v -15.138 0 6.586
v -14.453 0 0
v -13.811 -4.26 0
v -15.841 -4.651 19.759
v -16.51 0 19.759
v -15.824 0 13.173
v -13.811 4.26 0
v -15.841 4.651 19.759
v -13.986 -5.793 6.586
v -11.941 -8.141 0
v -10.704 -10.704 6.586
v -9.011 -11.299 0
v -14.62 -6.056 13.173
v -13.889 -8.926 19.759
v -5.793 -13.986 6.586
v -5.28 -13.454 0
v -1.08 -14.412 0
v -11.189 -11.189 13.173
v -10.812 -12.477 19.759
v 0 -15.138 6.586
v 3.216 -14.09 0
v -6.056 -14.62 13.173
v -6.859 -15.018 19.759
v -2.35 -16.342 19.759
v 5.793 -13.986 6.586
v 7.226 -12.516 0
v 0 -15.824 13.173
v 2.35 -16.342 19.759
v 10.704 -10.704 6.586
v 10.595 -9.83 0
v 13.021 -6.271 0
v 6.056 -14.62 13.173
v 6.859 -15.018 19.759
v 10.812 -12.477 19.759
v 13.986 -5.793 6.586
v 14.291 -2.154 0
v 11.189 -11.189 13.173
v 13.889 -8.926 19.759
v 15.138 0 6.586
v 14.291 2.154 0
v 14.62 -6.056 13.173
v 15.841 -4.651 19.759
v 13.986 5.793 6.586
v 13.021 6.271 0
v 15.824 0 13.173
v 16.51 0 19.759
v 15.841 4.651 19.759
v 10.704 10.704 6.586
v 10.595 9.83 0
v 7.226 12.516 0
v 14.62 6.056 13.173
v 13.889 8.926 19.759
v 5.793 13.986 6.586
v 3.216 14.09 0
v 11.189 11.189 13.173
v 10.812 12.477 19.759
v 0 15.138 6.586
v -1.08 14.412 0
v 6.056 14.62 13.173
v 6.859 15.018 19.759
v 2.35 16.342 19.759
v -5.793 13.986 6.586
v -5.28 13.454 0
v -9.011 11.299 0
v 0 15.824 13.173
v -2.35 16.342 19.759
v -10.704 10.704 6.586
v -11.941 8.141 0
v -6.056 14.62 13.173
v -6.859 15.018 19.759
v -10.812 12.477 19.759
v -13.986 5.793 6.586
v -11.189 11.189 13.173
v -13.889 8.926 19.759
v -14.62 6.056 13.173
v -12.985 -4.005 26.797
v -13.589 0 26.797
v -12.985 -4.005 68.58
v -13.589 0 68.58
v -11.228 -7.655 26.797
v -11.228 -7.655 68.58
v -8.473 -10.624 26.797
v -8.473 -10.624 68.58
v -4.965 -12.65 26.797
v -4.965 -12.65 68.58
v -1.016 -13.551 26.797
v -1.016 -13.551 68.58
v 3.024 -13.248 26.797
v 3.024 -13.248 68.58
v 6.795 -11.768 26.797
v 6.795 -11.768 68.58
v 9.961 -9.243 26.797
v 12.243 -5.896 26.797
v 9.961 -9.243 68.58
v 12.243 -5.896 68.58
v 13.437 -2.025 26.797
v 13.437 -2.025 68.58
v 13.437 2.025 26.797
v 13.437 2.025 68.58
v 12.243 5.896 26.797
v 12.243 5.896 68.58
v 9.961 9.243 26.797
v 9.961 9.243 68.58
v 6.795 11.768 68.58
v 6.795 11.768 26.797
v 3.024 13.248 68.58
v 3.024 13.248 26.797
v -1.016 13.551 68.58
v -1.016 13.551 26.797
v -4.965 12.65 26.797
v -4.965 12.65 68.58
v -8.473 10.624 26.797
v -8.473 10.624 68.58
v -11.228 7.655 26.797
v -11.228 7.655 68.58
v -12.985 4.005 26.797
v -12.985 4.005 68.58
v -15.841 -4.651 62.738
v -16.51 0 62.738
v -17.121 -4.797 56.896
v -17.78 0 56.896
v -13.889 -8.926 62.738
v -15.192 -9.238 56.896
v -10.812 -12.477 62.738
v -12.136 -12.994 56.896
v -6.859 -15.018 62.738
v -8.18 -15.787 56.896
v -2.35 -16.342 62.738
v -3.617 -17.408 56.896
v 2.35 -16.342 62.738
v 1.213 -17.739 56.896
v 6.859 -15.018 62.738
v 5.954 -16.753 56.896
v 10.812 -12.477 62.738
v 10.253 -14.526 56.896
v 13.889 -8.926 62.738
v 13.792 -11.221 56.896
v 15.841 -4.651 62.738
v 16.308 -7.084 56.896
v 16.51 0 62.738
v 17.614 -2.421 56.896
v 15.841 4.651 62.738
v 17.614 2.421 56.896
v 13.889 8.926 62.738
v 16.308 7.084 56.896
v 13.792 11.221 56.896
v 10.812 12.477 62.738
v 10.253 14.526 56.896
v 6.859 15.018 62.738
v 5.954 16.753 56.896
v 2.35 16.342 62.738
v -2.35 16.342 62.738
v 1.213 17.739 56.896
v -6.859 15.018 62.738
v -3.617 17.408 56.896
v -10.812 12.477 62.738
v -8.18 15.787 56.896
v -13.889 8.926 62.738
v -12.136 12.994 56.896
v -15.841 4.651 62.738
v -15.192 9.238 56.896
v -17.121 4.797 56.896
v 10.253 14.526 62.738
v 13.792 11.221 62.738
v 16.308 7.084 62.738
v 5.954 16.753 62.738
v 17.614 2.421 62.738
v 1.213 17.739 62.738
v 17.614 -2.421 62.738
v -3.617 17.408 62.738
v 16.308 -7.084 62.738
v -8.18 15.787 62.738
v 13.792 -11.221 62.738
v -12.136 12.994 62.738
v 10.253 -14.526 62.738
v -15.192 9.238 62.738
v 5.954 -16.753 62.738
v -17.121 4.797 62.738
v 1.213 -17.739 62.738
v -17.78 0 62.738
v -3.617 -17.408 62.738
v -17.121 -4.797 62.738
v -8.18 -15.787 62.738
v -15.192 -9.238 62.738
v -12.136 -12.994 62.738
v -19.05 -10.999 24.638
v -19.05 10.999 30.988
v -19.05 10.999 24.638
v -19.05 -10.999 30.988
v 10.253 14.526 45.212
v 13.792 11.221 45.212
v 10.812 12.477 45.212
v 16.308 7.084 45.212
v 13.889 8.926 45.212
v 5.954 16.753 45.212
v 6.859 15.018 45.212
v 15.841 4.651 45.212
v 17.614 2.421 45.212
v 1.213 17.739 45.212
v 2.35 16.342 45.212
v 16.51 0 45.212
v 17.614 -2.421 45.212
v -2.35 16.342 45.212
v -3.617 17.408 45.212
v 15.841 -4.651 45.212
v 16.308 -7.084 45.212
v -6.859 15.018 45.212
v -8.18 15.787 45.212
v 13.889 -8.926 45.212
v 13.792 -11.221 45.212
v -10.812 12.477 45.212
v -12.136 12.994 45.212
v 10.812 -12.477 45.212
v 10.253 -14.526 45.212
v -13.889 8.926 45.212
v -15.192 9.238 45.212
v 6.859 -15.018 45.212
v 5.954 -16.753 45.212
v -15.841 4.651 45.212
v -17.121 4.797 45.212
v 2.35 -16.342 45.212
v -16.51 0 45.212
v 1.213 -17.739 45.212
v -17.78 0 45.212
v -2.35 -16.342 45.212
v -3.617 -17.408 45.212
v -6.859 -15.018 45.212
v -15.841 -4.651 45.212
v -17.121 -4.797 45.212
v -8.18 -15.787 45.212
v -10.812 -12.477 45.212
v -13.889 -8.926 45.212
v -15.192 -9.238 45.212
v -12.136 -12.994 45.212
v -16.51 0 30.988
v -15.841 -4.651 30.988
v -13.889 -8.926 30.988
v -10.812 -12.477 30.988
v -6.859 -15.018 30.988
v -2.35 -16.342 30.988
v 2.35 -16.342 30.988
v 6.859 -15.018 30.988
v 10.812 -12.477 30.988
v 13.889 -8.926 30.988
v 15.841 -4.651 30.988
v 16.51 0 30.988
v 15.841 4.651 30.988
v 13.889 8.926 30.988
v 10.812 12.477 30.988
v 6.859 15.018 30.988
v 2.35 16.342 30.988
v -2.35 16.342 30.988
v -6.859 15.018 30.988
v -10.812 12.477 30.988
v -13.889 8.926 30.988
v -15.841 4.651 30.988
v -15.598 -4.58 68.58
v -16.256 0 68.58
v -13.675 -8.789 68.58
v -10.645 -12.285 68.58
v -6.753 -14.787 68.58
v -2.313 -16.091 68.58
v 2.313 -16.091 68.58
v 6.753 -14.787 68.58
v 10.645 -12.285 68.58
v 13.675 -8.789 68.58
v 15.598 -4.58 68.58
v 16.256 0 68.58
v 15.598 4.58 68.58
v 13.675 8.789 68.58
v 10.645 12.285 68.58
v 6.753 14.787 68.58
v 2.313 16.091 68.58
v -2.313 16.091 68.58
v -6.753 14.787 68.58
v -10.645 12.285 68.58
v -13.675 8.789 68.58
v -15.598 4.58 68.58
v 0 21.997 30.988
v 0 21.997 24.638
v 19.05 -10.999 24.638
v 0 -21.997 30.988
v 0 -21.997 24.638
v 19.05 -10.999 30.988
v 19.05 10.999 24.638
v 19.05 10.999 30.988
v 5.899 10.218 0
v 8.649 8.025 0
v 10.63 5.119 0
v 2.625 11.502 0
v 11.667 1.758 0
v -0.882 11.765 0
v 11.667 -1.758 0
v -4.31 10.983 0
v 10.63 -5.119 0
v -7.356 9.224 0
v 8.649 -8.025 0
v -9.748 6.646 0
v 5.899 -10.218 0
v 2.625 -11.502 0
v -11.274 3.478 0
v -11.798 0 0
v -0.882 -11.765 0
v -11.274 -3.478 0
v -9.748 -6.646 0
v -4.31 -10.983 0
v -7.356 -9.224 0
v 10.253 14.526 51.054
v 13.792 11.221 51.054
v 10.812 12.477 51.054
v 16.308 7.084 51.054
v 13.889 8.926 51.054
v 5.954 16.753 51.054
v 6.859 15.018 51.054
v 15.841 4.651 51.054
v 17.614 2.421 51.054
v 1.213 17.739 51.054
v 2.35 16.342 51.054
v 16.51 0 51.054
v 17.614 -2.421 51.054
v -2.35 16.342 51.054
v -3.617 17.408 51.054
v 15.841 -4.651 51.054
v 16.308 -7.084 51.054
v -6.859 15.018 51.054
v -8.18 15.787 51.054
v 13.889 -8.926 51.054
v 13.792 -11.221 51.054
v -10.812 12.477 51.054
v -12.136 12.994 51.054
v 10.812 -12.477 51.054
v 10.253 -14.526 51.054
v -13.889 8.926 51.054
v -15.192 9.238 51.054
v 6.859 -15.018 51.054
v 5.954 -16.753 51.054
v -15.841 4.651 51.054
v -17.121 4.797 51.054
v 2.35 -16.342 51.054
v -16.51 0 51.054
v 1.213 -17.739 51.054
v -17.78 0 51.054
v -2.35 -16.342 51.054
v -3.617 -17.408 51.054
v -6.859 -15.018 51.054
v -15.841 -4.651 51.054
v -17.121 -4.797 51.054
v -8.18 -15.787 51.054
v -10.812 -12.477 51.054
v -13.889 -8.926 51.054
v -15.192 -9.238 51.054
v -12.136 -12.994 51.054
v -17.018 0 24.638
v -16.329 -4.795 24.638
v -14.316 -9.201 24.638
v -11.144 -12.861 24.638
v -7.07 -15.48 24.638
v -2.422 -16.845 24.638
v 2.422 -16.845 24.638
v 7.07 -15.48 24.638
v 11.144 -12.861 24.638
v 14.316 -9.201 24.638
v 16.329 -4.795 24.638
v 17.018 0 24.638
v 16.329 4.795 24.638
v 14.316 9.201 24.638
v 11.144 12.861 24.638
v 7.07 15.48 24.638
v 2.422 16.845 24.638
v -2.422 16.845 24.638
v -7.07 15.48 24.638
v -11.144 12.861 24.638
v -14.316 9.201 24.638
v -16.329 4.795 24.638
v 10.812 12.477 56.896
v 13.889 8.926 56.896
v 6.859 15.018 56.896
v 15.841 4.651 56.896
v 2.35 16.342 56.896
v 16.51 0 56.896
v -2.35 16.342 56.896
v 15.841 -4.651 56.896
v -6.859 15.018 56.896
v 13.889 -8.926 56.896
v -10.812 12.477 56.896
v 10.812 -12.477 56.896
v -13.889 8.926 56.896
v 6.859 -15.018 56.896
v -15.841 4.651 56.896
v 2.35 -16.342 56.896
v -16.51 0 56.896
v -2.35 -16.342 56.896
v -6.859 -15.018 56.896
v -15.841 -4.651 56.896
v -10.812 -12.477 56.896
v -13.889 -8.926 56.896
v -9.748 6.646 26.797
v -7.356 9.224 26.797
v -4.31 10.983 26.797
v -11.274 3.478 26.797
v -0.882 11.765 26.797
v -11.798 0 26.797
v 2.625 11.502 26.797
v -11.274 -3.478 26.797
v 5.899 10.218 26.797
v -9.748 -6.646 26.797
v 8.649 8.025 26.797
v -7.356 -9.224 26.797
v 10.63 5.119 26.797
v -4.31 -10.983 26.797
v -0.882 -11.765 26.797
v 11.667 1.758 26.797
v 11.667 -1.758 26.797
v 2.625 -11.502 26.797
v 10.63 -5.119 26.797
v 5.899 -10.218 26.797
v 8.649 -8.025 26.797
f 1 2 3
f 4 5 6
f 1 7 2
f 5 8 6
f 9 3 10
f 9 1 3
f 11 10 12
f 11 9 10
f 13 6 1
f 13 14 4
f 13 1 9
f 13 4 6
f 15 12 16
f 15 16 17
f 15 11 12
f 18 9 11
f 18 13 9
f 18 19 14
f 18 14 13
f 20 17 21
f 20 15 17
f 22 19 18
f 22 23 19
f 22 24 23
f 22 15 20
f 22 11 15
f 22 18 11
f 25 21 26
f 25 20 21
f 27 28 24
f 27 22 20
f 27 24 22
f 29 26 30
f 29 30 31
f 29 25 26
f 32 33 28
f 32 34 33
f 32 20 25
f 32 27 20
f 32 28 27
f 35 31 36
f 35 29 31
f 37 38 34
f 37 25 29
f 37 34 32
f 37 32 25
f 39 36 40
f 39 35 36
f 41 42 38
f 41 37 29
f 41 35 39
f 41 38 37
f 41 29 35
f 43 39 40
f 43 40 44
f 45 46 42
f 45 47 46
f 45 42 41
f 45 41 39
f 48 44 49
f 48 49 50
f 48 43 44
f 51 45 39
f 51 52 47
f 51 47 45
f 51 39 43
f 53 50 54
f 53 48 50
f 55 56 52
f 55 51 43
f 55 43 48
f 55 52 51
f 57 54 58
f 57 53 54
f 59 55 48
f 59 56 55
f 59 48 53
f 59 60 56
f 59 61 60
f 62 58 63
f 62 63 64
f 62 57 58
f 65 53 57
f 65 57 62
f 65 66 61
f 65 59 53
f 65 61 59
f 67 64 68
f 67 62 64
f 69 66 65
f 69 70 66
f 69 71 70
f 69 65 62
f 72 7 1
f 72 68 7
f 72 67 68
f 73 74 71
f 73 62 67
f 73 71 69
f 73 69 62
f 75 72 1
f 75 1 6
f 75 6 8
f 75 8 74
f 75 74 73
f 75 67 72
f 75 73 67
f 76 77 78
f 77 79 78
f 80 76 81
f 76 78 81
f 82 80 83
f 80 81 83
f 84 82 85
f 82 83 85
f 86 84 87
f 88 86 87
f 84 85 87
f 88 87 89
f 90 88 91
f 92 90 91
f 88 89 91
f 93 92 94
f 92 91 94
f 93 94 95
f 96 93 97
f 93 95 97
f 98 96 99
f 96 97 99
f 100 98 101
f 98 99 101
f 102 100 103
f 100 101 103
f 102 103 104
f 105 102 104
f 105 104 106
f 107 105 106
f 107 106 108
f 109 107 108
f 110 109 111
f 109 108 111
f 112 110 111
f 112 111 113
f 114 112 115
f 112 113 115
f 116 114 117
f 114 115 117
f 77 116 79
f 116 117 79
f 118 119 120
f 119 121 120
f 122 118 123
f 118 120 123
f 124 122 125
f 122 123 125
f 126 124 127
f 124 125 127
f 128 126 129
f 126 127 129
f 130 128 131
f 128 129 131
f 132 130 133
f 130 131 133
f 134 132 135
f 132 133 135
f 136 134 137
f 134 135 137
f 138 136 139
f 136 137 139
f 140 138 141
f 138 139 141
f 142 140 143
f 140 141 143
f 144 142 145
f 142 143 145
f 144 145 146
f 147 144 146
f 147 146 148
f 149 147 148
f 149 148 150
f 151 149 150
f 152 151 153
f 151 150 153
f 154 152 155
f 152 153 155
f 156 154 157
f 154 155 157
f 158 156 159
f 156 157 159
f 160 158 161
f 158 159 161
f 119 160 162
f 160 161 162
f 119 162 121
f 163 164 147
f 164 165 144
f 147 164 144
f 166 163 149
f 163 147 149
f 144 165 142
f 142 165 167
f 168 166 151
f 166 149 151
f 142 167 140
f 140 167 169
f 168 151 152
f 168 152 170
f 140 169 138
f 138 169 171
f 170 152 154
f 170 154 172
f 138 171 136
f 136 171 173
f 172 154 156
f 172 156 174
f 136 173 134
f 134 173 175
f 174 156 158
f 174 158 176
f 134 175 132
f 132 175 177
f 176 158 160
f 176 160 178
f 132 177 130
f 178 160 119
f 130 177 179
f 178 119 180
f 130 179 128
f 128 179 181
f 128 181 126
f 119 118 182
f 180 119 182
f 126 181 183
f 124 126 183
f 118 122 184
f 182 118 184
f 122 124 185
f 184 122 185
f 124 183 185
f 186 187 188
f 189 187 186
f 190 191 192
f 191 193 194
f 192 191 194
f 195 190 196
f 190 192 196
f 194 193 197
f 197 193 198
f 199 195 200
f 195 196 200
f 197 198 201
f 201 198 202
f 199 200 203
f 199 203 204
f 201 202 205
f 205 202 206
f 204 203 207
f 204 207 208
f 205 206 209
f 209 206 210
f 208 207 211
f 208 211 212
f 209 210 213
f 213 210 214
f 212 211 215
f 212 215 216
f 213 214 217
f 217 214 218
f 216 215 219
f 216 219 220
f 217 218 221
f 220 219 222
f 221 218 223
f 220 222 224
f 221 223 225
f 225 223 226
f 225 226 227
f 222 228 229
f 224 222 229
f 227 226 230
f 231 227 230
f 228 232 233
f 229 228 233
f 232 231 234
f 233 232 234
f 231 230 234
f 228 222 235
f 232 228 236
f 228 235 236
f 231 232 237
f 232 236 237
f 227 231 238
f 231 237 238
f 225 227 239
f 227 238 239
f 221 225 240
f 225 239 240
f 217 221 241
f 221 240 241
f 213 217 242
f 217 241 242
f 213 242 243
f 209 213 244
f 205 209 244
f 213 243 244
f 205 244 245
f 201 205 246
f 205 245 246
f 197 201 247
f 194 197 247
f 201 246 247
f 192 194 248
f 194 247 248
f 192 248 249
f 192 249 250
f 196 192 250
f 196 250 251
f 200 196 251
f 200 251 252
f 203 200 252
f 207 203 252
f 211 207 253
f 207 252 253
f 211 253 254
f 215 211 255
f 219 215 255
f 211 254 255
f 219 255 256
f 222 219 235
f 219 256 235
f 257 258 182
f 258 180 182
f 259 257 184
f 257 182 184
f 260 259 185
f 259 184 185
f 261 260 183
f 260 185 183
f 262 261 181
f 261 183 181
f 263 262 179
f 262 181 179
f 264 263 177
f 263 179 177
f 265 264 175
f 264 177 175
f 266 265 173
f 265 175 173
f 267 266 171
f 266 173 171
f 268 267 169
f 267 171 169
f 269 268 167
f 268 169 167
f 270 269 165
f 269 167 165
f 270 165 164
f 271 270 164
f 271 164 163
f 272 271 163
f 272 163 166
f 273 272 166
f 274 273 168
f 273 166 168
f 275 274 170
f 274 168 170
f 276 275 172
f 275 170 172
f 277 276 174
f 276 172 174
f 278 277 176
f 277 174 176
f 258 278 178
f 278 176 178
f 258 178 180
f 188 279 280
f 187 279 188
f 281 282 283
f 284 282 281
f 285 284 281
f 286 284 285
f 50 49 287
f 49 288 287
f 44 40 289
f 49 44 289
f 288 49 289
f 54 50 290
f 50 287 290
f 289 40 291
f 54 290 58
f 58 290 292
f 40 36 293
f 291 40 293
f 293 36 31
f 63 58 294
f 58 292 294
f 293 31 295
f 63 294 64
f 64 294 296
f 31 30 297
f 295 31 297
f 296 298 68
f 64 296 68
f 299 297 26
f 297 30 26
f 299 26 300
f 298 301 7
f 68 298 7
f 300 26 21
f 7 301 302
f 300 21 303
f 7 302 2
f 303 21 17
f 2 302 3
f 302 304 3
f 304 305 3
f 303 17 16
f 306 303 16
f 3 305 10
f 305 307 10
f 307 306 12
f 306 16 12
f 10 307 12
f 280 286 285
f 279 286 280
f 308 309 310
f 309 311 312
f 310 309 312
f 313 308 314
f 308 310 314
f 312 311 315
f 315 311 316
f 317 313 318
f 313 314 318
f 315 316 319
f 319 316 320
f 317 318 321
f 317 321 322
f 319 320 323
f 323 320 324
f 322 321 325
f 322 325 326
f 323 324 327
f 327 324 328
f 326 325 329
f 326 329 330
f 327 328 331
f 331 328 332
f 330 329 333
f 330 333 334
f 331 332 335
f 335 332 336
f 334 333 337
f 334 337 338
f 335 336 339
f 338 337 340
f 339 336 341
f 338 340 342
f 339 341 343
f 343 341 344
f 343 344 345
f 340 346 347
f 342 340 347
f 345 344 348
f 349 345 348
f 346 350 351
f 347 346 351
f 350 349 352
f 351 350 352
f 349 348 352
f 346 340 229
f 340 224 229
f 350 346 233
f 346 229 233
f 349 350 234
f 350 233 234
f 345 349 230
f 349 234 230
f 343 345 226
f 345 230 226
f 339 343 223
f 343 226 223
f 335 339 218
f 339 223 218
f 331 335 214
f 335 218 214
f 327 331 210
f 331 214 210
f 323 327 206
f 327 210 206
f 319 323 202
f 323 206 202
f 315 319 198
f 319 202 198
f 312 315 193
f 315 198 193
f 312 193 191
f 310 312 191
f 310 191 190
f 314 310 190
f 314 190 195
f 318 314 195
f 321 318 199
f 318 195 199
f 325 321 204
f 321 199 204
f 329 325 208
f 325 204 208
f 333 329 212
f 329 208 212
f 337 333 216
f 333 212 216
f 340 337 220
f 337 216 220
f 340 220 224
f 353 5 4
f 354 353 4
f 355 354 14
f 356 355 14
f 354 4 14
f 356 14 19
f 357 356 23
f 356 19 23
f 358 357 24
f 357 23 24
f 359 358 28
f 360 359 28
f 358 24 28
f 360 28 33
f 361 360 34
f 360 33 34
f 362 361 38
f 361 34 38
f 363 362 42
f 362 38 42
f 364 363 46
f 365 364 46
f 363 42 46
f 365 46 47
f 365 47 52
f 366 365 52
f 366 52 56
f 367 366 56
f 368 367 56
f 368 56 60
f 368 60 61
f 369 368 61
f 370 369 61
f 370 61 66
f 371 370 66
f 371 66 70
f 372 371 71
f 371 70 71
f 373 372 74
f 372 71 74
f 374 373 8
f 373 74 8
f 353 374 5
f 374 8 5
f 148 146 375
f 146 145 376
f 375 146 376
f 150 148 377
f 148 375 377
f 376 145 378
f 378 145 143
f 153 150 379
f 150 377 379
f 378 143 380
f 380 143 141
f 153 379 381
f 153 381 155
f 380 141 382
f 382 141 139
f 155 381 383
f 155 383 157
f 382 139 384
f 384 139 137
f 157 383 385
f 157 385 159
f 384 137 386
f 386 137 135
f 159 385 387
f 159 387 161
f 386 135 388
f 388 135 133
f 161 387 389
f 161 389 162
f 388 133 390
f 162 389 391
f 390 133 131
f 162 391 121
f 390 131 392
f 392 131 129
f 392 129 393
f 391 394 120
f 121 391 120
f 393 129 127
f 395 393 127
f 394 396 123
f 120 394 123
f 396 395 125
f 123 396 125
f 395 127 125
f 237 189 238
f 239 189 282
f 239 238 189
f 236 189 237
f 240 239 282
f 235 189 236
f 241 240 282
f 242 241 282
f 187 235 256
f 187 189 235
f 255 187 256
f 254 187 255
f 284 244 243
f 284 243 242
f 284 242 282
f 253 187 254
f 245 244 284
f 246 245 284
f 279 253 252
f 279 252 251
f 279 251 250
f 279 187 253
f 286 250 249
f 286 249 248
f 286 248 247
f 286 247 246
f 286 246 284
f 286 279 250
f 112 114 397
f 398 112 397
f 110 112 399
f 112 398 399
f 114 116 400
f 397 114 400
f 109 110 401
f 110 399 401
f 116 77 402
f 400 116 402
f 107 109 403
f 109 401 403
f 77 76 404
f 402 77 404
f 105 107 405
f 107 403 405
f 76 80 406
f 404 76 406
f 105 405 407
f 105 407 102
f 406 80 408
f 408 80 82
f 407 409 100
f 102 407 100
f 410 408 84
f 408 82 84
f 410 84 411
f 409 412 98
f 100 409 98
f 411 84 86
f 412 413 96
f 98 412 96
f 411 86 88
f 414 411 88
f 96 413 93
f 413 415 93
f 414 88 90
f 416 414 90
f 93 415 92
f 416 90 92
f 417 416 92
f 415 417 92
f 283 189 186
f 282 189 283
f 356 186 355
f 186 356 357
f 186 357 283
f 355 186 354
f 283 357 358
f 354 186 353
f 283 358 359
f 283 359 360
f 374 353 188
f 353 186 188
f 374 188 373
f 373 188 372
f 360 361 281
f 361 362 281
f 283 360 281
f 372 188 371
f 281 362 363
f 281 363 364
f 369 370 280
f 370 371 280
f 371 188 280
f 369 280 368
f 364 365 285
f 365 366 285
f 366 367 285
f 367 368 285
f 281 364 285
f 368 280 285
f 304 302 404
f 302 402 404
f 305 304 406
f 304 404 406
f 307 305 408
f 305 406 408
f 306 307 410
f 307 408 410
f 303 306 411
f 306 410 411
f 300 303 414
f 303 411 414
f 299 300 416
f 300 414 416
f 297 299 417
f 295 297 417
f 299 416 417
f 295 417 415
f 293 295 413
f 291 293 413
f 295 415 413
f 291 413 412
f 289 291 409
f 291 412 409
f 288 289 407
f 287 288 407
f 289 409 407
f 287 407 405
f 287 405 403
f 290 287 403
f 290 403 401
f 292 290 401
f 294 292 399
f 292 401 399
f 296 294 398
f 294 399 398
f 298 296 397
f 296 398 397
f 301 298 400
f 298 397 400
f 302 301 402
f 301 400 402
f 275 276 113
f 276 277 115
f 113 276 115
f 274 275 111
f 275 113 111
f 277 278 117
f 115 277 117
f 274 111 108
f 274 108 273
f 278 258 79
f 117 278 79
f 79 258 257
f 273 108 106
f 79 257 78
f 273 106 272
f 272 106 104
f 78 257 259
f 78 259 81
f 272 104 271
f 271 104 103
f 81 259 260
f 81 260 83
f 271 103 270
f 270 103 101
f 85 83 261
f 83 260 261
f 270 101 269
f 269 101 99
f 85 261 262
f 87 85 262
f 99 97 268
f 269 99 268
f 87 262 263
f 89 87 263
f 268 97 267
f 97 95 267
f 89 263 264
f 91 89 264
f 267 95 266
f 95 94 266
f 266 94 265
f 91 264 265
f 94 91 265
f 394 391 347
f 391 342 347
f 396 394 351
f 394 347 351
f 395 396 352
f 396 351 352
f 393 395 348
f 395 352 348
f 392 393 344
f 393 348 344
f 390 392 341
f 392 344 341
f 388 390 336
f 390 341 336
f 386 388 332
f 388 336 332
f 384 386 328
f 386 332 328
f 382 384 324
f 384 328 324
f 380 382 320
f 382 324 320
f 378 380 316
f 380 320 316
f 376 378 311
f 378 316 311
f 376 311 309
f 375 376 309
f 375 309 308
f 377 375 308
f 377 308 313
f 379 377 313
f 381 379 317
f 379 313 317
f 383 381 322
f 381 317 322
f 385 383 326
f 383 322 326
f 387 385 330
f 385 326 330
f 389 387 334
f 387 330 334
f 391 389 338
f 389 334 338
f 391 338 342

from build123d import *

# Parameters (mm, degrees)
F3_R     = 16.51
F4_DEPTH = 6.35


with BuildPart() as f1:
    # F0 (on Front) → F1 (revolve)
    with BuildSketch(Plane.XZ):
        Polygon((-13.589, 26.797), (-13.589, 68.58), (-16.256, 68.58), (-17.78, 62.738), (-16.51, 62.738), (-17.78, 56.896), (-16.51, 56.896), (-17.78, 51.054), (-16.51, 51.054), (-17.78, 45.212), (-16.51, 45.212), (-16.51, 0), (-11.7983, 0), (-11.7983, 26.797), align=None)
    revolve(axis=Axis((0, 0, 34.29), (0, 0, 1)))

    # F3 (on offset) → F4 (join)
    with BuildSketch(Plane.XY.offset(30.988)):
        Polygon((19.05, 10.9985226281), (0, 21.9970452561), (-19.05, 10.9985226281), (-19.05, -10.9985226281), (0, -21.9970452561), (19.05, -10.9985226281), align=None)
        Circle(F3_R, mode=Mode.SUBTRACT)
    extrude(amount=-F4_DEPTH)

    # F6 (on Front) → F7 (revolve)
    with BuildSketch(Plane.XZ):
        Polygon((-16.51, 24.638), (-17.018, 24.638), (-16.51, 19.7591881188), align=None)
    revolve(axis=Axis((0, 0, 12.319), (0, 0, 1)))

    # F8 (on Front) → F9 (revolve, cut)
    with BuildSketch(Plane.XZ):
        Polygon((-14.4526, 0), (-16.51, 19.7591881188), (-16.51, 0), align=None)
    revolve(axis=Axis((0, 0, 12.319), (0, 0, 1)), mode=Mode.SUBTRACT)


solid = f1.part
